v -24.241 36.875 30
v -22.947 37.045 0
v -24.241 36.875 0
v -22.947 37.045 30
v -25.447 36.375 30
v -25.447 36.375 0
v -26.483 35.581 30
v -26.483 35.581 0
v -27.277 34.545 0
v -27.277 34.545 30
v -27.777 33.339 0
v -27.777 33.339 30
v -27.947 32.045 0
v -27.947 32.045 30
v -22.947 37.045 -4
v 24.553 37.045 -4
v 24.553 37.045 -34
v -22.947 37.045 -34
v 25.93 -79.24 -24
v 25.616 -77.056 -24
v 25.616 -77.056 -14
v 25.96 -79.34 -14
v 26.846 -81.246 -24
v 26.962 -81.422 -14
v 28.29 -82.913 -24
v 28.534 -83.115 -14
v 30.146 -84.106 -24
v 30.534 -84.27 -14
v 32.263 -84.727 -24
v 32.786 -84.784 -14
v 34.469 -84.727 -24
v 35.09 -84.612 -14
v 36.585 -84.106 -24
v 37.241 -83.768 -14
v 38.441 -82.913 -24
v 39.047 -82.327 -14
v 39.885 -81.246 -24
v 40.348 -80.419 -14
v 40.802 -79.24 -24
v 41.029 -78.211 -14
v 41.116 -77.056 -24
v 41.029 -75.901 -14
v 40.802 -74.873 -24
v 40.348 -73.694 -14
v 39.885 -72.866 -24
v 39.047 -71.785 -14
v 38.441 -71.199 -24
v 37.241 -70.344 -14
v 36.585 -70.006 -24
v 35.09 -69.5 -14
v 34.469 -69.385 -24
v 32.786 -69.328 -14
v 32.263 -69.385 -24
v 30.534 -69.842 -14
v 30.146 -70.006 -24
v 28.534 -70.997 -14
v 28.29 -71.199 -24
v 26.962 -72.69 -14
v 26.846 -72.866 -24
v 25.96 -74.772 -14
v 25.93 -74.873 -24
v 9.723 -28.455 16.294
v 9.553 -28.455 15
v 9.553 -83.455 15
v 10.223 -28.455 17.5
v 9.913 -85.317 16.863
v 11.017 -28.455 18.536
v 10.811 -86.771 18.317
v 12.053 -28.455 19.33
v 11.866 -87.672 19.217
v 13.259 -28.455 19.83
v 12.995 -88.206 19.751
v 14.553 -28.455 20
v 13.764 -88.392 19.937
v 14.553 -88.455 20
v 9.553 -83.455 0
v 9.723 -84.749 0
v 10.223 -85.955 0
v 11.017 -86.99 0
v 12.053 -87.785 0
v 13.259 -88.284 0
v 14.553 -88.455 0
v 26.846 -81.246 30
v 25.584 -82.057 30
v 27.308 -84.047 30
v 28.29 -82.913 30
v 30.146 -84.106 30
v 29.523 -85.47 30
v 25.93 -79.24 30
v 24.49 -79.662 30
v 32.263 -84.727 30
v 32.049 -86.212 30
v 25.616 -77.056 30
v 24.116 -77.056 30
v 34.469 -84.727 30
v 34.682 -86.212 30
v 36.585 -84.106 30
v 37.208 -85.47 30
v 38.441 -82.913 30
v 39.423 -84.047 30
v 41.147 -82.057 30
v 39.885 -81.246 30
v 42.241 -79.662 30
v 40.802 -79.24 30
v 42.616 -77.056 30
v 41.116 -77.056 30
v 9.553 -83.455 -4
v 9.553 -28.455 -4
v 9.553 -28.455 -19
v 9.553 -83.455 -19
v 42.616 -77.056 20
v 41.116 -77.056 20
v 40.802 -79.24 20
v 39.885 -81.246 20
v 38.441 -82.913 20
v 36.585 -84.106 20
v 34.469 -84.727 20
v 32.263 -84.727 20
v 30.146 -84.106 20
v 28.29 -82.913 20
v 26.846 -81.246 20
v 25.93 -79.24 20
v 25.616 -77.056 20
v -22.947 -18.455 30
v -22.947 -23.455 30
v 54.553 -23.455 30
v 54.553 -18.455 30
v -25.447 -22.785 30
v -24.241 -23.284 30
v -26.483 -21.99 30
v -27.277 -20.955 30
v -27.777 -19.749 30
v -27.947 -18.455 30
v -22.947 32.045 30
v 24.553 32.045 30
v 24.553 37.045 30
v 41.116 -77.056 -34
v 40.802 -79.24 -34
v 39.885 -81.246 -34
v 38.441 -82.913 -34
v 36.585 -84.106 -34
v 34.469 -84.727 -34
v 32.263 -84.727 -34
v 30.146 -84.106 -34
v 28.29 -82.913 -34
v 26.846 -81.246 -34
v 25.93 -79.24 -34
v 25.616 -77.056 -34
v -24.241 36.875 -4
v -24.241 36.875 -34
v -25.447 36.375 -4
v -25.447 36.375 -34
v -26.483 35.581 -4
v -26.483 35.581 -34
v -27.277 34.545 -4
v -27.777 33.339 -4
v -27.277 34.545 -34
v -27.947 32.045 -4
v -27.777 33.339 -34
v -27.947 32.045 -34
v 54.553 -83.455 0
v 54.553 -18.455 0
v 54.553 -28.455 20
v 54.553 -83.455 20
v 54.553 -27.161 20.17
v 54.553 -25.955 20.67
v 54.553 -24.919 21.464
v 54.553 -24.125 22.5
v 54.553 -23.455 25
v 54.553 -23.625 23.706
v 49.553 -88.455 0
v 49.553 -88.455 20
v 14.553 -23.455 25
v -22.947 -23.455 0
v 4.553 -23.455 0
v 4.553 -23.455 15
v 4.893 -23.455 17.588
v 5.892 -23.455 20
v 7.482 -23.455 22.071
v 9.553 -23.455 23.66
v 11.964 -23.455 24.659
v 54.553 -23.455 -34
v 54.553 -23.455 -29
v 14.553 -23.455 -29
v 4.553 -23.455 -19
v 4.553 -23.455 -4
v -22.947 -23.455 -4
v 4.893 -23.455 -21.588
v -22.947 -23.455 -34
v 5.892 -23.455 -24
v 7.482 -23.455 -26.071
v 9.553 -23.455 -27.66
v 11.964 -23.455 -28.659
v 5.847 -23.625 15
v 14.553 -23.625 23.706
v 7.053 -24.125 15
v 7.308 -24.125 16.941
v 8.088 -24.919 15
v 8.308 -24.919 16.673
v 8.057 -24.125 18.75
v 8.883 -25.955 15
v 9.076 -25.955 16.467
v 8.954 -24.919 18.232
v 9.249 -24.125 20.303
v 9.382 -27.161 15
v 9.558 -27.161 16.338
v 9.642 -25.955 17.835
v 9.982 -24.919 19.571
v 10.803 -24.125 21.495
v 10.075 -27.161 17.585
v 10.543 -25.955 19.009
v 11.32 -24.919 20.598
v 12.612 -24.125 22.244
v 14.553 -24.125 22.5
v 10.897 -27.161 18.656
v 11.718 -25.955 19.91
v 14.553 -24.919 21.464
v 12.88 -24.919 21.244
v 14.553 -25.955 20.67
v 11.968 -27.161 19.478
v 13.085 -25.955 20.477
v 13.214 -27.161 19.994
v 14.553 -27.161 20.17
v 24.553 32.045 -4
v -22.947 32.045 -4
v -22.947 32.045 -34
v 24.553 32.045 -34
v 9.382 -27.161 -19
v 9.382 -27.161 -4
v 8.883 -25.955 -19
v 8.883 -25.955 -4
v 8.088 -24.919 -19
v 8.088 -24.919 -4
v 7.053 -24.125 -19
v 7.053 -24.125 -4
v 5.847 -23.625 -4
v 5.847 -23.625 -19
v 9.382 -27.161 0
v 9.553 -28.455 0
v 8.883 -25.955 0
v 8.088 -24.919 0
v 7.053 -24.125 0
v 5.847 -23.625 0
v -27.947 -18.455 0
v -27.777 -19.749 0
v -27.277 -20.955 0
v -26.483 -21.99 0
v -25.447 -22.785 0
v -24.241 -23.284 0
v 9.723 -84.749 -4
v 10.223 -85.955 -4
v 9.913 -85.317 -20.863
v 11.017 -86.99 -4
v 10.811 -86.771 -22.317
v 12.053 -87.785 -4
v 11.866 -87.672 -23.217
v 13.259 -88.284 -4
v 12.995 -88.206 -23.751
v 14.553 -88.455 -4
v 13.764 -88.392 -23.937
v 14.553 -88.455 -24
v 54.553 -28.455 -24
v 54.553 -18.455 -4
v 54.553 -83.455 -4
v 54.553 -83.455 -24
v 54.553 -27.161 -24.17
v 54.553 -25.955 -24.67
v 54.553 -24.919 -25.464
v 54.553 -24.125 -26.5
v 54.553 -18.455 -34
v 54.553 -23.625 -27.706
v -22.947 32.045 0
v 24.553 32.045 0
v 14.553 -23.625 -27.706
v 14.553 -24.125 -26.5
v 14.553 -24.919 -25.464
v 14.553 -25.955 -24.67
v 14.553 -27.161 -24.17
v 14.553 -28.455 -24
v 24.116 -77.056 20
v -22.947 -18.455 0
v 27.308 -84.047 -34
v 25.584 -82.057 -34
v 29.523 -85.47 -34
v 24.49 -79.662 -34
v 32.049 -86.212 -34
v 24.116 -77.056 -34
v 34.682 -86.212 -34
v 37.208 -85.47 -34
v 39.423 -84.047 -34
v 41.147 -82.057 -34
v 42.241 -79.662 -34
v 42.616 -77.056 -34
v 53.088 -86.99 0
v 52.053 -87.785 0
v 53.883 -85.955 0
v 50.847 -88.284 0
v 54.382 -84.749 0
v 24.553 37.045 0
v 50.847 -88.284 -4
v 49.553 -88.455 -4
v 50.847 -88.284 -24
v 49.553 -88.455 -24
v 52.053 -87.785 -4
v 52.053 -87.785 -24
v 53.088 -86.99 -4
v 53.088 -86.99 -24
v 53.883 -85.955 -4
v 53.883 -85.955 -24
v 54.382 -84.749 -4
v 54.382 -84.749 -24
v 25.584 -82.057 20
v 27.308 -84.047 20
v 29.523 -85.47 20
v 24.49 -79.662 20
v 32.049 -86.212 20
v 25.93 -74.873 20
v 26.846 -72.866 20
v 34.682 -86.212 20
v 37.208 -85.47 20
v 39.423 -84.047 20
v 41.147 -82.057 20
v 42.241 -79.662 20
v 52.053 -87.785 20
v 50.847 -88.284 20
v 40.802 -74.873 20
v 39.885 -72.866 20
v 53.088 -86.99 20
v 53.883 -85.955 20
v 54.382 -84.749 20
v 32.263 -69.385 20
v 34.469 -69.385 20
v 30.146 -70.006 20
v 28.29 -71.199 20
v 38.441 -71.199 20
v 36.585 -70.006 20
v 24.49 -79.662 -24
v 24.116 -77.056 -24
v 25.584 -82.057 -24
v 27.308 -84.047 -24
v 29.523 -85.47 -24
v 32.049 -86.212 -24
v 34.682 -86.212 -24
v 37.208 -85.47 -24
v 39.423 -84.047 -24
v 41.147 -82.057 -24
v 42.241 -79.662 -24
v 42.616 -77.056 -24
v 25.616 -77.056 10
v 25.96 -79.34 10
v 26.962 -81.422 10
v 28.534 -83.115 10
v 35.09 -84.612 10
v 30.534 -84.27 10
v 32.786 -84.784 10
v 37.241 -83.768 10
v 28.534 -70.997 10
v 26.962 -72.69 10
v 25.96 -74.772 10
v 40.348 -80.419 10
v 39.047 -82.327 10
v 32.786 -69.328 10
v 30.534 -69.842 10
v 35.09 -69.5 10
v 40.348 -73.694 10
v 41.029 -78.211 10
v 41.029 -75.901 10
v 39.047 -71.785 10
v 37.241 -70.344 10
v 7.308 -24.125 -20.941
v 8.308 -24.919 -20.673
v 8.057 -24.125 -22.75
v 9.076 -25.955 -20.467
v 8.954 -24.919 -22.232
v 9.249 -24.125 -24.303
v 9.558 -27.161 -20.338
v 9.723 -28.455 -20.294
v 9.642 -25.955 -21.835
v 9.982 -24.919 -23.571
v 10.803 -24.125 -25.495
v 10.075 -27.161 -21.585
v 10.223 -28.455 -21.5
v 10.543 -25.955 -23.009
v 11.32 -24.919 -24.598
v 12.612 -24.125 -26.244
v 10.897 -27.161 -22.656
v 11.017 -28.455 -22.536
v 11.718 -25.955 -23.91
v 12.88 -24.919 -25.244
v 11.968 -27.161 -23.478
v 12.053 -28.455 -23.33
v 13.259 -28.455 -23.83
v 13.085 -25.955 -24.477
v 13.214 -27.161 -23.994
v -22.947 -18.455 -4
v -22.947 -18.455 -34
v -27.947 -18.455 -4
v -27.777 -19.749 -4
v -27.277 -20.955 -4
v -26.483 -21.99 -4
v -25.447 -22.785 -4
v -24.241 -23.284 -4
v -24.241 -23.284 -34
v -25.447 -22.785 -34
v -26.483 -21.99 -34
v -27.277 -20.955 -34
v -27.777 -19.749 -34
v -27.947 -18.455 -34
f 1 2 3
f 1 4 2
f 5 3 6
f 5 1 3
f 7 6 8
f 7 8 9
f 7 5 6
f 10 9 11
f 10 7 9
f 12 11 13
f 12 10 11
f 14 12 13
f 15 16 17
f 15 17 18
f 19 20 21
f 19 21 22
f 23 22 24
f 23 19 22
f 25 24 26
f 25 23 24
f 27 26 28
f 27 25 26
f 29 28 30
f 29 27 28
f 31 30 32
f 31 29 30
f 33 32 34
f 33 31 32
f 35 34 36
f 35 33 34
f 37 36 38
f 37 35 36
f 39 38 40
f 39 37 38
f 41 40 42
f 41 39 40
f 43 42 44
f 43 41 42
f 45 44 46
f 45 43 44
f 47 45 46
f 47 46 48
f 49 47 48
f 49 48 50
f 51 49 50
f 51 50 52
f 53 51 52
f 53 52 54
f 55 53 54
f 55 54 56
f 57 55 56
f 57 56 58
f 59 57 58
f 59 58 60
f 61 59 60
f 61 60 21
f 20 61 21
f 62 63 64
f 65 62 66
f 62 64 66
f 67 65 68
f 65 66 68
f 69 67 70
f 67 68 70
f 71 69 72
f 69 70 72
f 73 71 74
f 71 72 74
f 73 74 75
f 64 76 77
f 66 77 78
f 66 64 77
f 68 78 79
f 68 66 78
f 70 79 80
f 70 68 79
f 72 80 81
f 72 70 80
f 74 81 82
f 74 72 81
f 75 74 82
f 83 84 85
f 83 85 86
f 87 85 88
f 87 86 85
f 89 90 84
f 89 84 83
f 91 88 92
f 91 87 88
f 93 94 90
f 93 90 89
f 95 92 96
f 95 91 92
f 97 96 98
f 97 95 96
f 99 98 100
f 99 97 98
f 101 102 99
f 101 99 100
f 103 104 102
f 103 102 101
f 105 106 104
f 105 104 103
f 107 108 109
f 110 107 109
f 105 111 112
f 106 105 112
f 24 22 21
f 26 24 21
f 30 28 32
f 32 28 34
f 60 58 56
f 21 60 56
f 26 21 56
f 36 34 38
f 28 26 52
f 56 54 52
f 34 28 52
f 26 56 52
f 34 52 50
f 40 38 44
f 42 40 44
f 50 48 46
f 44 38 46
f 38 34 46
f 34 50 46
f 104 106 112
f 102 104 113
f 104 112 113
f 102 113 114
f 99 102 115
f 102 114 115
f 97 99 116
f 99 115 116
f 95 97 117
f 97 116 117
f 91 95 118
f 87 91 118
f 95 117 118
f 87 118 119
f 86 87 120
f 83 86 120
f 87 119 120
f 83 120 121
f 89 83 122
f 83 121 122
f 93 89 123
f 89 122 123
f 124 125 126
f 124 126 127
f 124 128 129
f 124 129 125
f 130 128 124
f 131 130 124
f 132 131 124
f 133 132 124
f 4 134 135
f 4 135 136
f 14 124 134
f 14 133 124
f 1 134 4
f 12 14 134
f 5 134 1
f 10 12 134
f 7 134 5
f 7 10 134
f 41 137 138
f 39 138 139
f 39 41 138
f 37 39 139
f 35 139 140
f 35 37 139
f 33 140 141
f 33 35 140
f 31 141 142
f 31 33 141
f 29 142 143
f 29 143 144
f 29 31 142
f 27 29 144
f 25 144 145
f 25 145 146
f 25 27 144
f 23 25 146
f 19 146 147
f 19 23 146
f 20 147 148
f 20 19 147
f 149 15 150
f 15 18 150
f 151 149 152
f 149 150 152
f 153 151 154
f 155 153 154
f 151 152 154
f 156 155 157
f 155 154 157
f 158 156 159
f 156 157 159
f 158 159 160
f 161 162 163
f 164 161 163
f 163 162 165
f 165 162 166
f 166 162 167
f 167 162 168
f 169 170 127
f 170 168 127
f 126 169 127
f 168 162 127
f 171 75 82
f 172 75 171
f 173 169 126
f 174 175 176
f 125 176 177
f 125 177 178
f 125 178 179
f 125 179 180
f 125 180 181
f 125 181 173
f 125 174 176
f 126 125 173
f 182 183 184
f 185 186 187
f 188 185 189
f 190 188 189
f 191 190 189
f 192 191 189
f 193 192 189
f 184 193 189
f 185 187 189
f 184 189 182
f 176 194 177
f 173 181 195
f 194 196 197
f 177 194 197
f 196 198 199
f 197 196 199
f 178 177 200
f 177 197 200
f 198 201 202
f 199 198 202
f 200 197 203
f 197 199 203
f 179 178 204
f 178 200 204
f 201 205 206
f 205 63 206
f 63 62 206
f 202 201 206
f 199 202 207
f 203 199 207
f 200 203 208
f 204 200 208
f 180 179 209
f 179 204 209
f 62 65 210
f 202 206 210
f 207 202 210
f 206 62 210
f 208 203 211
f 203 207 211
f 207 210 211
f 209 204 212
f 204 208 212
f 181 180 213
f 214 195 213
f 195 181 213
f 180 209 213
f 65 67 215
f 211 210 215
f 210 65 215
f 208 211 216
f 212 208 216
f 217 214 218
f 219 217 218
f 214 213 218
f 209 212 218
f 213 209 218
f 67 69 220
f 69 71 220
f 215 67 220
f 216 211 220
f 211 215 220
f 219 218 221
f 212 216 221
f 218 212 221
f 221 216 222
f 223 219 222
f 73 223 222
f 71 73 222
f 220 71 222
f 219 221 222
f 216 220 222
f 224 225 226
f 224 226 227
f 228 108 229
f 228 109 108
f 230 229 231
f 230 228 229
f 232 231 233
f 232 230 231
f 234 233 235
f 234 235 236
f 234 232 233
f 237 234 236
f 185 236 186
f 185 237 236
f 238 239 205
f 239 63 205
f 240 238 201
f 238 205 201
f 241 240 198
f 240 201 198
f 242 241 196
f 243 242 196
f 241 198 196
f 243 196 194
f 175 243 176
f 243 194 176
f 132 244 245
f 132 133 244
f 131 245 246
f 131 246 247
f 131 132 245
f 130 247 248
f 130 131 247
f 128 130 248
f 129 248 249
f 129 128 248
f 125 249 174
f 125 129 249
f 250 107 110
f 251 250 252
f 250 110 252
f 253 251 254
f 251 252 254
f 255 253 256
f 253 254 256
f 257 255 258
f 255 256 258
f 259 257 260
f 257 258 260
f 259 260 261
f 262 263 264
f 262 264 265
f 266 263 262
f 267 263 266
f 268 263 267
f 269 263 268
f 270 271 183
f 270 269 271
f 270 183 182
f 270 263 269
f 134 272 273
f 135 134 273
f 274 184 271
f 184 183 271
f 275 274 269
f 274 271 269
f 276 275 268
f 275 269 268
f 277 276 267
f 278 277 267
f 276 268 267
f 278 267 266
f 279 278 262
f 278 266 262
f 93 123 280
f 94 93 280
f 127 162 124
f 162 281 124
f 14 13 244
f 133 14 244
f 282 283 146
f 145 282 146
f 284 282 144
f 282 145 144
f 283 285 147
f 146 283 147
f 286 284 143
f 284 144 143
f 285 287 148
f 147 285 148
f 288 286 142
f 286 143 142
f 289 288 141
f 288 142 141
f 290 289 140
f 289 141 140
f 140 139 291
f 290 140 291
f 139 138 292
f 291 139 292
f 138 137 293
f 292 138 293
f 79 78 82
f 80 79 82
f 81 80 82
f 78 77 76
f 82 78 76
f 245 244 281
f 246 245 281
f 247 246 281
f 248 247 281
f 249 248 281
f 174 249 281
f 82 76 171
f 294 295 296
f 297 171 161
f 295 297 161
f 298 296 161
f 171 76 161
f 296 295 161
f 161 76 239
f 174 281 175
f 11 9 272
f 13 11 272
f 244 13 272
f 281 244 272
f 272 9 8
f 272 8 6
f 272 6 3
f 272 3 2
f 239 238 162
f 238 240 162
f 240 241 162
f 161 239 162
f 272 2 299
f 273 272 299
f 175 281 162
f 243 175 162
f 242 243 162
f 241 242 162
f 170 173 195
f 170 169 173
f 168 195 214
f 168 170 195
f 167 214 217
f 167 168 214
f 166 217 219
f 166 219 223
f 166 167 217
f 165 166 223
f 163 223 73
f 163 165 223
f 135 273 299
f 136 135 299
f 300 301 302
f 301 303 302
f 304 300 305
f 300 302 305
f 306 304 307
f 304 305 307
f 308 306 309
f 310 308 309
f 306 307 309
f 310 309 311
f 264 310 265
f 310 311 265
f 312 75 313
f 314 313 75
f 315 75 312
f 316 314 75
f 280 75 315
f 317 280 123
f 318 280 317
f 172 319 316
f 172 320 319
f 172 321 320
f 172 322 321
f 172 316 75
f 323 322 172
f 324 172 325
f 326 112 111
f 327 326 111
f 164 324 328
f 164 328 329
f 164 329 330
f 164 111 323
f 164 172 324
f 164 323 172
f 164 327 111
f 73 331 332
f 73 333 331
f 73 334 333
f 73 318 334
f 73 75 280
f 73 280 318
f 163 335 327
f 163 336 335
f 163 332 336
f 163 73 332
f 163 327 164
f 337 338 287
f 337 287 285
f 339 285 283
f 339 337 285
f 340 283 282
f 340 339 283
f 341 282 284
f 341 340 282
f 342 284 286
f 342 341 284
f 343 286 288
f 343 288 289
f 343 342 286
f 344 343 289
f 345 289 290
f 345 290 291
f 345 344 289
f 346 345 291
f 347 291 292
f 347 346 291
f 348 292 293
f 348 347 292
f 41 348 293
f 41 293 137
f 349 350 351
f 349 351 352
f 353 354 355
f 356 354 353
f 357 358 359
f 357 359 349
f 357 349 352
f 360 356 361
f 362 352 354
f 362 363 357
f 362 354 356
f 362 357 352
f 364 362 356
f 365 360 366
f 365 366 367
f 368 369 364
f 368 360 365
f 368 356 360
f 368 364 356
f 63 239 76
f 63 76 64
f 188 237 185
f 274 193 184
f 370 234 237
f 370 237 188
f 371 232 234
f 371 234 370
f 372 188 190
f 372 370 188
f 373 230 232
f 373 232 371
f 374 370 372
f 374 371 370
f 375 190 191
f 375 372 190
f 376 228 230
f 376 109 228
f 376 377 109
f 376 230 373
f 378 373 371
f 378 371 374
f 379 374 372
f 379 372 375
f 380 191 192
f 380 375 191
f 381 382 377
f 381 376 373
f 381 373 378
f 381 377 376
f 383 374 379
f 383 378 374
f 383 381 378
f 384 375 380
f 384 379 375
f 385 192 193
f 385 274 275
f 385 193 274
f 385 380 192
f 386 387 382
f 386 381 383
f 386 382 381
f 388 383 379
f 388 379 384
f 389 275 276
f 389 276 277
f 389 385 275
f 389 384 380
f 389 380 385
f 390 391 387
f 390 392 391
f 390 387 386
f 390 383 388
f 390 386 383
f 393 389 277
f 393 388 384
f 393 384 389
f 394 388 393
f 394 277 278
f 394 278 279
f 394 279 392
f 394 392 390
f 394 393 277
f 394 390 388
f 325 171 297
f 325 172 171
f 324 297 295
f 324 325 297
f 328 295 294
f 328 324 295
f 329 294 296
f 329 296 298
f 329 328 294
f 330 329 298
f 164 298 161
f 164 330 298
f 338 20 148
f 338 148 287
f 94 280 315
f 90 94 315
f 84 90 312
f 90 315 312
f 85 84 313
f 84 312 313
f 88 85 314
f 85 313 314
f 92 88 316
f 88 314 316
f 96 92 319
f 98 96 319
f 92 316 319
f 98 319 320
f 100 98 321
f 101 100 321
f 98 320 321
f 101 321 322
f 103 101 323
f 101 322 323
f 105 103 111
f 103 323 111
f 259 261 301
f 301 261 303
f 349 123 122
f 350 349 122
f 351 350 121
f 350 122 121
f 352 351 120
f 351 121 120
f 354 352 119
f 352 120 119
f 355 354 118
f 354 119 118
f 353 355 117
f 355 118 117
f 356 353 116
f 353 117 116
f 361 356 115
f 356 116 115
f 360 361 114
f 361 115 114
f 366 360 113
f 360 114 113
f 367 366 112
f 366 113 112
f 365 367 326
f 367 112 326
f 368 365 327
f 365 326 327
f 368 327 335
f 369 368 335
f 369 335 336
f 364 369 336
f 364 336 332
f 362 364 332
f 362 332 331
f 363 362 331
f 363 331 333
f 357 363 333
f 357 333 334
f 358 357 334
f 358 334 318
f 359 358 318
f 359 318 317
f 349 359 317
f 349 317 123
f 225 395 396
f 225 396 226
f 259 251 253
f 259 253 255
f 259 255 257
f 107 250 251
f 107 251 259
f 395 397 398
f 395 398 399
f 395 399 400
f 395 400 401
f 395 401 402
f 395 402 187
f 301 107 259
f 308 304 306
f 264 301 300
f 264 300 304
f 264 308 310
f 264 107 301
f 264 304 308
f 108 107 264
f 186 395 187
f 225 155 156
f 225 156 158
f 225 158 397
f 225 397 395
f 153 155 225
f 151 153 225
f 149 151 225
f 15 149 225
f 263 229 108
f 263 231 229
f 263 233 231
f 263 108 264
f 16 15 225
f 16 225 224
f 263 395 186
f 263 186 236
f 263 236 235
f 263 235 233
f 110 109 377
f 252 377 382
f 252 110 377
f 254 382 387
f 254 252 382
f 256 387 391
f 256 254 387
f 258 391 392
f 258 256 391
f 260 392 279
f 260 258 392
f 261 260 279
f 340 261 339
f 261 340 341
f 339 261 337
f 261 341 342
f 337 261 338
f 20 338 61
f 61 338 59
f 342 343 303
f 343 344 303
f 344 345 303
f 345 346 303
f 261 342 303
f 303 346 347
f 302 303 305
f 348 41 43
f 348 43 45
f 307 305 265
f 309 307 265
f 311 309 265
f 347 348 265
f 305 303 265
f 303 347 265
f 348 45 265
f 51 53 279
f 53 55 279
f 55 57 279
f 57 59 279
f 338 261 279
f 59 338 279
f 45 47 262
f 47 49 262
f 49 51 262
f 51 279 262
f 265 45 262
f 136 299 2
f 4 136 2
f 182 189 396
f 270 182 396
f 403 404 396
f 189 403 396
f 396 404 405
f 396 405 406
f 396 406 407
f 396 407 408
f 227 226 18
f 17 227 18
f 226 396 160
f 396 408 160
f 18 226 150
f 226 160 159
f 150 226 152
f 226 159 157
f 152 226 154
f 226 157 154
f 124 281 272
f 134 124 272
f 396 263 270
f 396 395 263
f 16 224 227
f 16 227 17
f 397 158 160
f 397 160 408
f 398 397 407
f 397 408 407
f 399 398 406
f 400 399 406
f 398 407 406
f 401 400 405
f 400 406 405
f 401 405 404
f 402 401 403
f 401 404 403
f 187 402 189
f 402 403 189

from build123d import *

# Parameters (mm, degrees)
F1_DEPTH  = 30
F2_DEPTH  = 30
F3_W      = 45
F3_H      = 20
F4_DEPTH  = 65
F5_R      = 5
F9_DEPTH  = 10
F10_DEPTH = 10


with BuildPart() as f1:
    # F0 (on Top) → F1 (new body)
    with BuildSketch(Plane.XY):
        Polygon((24.5526876748, 37.0452034771), (-27.9473123252, 37.0452034771), (-27.9473123252, -23.4547965229), (24.5526876748, -23.4547965229), (24.5526876748, -18.4547965229), (19.5526876748, -18.4547965229), (-22.9473123252, -18.4547965229), (-22.9473123252, 32.0452034771), (19.5526876748, 32.0452034771), (24.5526876748, 32.0452034771), align=None)
    extrude(amount=F1_DEPTH)

    # F2 (add): a face of the model
    f2_faces = [f1.faces().sort_by_distance(p)[0] for p in [
        (24.5526876748, -20.9547965229, 15),
    ]]
    extrude(f2_faces, amount=F2_DEPTH)

    # F3 (on face) → F4 (join)
    with BuildSketch(Plane.XZ.offset(23.4547965229)):
        with Locations((32.0526876748, 10)):
            Rectangle(F3_W, F3_H)
    extrude(amount=F4_DEPTH)

    # F5
    f5_edges = [f1.edges().sort_by_distance(p)[0] for p in [
        (-27.947312, -23.454797, 15),
        (9.552688, -55.954797, 20),
        (9.552688, -88.454797, 10),
        (54.552688, -88.454797, 10),
        (-27.947312, 37.045203, 15),
        (9.552688, -23.454797, 10),
        (32.052688, -23.454797, 20),
    ]]
    fillet(f5_edges, radius=F5_R)


with BuildPart() as f7_1:
    # F7: instance of F1
    add(f1.part.mirror(Plane.XY.offset(-2)))


with BuildPart() as f1_1:
    add(f1.part)

    # F8 (on face) → F9 (cut)
    with BuildSketch(Plane.XY.offset(20)):
        with BuildLine():
            Line((33.365637064, -77.0561248064), (41.115637064, -77.0561248064))
            ThreePointArc((41.115637064, -77.0561248064), (33.365637064, -69.3061248064), (25.615637064, -77.0561248064))
            Line((25.615637064, -77.0561248064), (33.365637064, -77.0561248064))
        make_face()
        with BuildLine():
            ThreePointArc((25.615637064, -77.0561248064), (33.365637064, -84.8061248064), (41.115637064, -77.0561248064))
            Line((41.115637064, -77.0561248064), (33.365637064, -77.0561248064))
            Line((33.365637064, -77.0561248064), (25.615637064, -77.0561248064))
        make_face()
    extrude(amount=-F9_DEPTH, mode=Mode.SUBTRACT)

    # F8 (on face) → F10 (join)
    with BuildSketch(Plane.XY.offset(20)):
        with BuildLine():
            Line((42.615637064, -77.0561248064), (41.115637064, -77.0561248064))
            ThreePointArc((41.115637064, -77.0561248064), (33.365637064, -84.8061248064), (25.615637064, -77.0561248064))
            Line((25.615637064, -77.0561248064), (24.115637064, -77.0561248064))
            ThreePointArc((24.115637064, -77.0561248064), (33.365637064, -86.3061248064), (42.615637064, -77.0561248064))
        make_face()
    extrude(amount=F10_DEPTH)


with BuildPart() as f12_1:
    # F12: instance of F1
    add(f1_1.part.mirror(Plane.XY.offset(-2)))


solid = Compound([f1_1.part, f12_1.part])
